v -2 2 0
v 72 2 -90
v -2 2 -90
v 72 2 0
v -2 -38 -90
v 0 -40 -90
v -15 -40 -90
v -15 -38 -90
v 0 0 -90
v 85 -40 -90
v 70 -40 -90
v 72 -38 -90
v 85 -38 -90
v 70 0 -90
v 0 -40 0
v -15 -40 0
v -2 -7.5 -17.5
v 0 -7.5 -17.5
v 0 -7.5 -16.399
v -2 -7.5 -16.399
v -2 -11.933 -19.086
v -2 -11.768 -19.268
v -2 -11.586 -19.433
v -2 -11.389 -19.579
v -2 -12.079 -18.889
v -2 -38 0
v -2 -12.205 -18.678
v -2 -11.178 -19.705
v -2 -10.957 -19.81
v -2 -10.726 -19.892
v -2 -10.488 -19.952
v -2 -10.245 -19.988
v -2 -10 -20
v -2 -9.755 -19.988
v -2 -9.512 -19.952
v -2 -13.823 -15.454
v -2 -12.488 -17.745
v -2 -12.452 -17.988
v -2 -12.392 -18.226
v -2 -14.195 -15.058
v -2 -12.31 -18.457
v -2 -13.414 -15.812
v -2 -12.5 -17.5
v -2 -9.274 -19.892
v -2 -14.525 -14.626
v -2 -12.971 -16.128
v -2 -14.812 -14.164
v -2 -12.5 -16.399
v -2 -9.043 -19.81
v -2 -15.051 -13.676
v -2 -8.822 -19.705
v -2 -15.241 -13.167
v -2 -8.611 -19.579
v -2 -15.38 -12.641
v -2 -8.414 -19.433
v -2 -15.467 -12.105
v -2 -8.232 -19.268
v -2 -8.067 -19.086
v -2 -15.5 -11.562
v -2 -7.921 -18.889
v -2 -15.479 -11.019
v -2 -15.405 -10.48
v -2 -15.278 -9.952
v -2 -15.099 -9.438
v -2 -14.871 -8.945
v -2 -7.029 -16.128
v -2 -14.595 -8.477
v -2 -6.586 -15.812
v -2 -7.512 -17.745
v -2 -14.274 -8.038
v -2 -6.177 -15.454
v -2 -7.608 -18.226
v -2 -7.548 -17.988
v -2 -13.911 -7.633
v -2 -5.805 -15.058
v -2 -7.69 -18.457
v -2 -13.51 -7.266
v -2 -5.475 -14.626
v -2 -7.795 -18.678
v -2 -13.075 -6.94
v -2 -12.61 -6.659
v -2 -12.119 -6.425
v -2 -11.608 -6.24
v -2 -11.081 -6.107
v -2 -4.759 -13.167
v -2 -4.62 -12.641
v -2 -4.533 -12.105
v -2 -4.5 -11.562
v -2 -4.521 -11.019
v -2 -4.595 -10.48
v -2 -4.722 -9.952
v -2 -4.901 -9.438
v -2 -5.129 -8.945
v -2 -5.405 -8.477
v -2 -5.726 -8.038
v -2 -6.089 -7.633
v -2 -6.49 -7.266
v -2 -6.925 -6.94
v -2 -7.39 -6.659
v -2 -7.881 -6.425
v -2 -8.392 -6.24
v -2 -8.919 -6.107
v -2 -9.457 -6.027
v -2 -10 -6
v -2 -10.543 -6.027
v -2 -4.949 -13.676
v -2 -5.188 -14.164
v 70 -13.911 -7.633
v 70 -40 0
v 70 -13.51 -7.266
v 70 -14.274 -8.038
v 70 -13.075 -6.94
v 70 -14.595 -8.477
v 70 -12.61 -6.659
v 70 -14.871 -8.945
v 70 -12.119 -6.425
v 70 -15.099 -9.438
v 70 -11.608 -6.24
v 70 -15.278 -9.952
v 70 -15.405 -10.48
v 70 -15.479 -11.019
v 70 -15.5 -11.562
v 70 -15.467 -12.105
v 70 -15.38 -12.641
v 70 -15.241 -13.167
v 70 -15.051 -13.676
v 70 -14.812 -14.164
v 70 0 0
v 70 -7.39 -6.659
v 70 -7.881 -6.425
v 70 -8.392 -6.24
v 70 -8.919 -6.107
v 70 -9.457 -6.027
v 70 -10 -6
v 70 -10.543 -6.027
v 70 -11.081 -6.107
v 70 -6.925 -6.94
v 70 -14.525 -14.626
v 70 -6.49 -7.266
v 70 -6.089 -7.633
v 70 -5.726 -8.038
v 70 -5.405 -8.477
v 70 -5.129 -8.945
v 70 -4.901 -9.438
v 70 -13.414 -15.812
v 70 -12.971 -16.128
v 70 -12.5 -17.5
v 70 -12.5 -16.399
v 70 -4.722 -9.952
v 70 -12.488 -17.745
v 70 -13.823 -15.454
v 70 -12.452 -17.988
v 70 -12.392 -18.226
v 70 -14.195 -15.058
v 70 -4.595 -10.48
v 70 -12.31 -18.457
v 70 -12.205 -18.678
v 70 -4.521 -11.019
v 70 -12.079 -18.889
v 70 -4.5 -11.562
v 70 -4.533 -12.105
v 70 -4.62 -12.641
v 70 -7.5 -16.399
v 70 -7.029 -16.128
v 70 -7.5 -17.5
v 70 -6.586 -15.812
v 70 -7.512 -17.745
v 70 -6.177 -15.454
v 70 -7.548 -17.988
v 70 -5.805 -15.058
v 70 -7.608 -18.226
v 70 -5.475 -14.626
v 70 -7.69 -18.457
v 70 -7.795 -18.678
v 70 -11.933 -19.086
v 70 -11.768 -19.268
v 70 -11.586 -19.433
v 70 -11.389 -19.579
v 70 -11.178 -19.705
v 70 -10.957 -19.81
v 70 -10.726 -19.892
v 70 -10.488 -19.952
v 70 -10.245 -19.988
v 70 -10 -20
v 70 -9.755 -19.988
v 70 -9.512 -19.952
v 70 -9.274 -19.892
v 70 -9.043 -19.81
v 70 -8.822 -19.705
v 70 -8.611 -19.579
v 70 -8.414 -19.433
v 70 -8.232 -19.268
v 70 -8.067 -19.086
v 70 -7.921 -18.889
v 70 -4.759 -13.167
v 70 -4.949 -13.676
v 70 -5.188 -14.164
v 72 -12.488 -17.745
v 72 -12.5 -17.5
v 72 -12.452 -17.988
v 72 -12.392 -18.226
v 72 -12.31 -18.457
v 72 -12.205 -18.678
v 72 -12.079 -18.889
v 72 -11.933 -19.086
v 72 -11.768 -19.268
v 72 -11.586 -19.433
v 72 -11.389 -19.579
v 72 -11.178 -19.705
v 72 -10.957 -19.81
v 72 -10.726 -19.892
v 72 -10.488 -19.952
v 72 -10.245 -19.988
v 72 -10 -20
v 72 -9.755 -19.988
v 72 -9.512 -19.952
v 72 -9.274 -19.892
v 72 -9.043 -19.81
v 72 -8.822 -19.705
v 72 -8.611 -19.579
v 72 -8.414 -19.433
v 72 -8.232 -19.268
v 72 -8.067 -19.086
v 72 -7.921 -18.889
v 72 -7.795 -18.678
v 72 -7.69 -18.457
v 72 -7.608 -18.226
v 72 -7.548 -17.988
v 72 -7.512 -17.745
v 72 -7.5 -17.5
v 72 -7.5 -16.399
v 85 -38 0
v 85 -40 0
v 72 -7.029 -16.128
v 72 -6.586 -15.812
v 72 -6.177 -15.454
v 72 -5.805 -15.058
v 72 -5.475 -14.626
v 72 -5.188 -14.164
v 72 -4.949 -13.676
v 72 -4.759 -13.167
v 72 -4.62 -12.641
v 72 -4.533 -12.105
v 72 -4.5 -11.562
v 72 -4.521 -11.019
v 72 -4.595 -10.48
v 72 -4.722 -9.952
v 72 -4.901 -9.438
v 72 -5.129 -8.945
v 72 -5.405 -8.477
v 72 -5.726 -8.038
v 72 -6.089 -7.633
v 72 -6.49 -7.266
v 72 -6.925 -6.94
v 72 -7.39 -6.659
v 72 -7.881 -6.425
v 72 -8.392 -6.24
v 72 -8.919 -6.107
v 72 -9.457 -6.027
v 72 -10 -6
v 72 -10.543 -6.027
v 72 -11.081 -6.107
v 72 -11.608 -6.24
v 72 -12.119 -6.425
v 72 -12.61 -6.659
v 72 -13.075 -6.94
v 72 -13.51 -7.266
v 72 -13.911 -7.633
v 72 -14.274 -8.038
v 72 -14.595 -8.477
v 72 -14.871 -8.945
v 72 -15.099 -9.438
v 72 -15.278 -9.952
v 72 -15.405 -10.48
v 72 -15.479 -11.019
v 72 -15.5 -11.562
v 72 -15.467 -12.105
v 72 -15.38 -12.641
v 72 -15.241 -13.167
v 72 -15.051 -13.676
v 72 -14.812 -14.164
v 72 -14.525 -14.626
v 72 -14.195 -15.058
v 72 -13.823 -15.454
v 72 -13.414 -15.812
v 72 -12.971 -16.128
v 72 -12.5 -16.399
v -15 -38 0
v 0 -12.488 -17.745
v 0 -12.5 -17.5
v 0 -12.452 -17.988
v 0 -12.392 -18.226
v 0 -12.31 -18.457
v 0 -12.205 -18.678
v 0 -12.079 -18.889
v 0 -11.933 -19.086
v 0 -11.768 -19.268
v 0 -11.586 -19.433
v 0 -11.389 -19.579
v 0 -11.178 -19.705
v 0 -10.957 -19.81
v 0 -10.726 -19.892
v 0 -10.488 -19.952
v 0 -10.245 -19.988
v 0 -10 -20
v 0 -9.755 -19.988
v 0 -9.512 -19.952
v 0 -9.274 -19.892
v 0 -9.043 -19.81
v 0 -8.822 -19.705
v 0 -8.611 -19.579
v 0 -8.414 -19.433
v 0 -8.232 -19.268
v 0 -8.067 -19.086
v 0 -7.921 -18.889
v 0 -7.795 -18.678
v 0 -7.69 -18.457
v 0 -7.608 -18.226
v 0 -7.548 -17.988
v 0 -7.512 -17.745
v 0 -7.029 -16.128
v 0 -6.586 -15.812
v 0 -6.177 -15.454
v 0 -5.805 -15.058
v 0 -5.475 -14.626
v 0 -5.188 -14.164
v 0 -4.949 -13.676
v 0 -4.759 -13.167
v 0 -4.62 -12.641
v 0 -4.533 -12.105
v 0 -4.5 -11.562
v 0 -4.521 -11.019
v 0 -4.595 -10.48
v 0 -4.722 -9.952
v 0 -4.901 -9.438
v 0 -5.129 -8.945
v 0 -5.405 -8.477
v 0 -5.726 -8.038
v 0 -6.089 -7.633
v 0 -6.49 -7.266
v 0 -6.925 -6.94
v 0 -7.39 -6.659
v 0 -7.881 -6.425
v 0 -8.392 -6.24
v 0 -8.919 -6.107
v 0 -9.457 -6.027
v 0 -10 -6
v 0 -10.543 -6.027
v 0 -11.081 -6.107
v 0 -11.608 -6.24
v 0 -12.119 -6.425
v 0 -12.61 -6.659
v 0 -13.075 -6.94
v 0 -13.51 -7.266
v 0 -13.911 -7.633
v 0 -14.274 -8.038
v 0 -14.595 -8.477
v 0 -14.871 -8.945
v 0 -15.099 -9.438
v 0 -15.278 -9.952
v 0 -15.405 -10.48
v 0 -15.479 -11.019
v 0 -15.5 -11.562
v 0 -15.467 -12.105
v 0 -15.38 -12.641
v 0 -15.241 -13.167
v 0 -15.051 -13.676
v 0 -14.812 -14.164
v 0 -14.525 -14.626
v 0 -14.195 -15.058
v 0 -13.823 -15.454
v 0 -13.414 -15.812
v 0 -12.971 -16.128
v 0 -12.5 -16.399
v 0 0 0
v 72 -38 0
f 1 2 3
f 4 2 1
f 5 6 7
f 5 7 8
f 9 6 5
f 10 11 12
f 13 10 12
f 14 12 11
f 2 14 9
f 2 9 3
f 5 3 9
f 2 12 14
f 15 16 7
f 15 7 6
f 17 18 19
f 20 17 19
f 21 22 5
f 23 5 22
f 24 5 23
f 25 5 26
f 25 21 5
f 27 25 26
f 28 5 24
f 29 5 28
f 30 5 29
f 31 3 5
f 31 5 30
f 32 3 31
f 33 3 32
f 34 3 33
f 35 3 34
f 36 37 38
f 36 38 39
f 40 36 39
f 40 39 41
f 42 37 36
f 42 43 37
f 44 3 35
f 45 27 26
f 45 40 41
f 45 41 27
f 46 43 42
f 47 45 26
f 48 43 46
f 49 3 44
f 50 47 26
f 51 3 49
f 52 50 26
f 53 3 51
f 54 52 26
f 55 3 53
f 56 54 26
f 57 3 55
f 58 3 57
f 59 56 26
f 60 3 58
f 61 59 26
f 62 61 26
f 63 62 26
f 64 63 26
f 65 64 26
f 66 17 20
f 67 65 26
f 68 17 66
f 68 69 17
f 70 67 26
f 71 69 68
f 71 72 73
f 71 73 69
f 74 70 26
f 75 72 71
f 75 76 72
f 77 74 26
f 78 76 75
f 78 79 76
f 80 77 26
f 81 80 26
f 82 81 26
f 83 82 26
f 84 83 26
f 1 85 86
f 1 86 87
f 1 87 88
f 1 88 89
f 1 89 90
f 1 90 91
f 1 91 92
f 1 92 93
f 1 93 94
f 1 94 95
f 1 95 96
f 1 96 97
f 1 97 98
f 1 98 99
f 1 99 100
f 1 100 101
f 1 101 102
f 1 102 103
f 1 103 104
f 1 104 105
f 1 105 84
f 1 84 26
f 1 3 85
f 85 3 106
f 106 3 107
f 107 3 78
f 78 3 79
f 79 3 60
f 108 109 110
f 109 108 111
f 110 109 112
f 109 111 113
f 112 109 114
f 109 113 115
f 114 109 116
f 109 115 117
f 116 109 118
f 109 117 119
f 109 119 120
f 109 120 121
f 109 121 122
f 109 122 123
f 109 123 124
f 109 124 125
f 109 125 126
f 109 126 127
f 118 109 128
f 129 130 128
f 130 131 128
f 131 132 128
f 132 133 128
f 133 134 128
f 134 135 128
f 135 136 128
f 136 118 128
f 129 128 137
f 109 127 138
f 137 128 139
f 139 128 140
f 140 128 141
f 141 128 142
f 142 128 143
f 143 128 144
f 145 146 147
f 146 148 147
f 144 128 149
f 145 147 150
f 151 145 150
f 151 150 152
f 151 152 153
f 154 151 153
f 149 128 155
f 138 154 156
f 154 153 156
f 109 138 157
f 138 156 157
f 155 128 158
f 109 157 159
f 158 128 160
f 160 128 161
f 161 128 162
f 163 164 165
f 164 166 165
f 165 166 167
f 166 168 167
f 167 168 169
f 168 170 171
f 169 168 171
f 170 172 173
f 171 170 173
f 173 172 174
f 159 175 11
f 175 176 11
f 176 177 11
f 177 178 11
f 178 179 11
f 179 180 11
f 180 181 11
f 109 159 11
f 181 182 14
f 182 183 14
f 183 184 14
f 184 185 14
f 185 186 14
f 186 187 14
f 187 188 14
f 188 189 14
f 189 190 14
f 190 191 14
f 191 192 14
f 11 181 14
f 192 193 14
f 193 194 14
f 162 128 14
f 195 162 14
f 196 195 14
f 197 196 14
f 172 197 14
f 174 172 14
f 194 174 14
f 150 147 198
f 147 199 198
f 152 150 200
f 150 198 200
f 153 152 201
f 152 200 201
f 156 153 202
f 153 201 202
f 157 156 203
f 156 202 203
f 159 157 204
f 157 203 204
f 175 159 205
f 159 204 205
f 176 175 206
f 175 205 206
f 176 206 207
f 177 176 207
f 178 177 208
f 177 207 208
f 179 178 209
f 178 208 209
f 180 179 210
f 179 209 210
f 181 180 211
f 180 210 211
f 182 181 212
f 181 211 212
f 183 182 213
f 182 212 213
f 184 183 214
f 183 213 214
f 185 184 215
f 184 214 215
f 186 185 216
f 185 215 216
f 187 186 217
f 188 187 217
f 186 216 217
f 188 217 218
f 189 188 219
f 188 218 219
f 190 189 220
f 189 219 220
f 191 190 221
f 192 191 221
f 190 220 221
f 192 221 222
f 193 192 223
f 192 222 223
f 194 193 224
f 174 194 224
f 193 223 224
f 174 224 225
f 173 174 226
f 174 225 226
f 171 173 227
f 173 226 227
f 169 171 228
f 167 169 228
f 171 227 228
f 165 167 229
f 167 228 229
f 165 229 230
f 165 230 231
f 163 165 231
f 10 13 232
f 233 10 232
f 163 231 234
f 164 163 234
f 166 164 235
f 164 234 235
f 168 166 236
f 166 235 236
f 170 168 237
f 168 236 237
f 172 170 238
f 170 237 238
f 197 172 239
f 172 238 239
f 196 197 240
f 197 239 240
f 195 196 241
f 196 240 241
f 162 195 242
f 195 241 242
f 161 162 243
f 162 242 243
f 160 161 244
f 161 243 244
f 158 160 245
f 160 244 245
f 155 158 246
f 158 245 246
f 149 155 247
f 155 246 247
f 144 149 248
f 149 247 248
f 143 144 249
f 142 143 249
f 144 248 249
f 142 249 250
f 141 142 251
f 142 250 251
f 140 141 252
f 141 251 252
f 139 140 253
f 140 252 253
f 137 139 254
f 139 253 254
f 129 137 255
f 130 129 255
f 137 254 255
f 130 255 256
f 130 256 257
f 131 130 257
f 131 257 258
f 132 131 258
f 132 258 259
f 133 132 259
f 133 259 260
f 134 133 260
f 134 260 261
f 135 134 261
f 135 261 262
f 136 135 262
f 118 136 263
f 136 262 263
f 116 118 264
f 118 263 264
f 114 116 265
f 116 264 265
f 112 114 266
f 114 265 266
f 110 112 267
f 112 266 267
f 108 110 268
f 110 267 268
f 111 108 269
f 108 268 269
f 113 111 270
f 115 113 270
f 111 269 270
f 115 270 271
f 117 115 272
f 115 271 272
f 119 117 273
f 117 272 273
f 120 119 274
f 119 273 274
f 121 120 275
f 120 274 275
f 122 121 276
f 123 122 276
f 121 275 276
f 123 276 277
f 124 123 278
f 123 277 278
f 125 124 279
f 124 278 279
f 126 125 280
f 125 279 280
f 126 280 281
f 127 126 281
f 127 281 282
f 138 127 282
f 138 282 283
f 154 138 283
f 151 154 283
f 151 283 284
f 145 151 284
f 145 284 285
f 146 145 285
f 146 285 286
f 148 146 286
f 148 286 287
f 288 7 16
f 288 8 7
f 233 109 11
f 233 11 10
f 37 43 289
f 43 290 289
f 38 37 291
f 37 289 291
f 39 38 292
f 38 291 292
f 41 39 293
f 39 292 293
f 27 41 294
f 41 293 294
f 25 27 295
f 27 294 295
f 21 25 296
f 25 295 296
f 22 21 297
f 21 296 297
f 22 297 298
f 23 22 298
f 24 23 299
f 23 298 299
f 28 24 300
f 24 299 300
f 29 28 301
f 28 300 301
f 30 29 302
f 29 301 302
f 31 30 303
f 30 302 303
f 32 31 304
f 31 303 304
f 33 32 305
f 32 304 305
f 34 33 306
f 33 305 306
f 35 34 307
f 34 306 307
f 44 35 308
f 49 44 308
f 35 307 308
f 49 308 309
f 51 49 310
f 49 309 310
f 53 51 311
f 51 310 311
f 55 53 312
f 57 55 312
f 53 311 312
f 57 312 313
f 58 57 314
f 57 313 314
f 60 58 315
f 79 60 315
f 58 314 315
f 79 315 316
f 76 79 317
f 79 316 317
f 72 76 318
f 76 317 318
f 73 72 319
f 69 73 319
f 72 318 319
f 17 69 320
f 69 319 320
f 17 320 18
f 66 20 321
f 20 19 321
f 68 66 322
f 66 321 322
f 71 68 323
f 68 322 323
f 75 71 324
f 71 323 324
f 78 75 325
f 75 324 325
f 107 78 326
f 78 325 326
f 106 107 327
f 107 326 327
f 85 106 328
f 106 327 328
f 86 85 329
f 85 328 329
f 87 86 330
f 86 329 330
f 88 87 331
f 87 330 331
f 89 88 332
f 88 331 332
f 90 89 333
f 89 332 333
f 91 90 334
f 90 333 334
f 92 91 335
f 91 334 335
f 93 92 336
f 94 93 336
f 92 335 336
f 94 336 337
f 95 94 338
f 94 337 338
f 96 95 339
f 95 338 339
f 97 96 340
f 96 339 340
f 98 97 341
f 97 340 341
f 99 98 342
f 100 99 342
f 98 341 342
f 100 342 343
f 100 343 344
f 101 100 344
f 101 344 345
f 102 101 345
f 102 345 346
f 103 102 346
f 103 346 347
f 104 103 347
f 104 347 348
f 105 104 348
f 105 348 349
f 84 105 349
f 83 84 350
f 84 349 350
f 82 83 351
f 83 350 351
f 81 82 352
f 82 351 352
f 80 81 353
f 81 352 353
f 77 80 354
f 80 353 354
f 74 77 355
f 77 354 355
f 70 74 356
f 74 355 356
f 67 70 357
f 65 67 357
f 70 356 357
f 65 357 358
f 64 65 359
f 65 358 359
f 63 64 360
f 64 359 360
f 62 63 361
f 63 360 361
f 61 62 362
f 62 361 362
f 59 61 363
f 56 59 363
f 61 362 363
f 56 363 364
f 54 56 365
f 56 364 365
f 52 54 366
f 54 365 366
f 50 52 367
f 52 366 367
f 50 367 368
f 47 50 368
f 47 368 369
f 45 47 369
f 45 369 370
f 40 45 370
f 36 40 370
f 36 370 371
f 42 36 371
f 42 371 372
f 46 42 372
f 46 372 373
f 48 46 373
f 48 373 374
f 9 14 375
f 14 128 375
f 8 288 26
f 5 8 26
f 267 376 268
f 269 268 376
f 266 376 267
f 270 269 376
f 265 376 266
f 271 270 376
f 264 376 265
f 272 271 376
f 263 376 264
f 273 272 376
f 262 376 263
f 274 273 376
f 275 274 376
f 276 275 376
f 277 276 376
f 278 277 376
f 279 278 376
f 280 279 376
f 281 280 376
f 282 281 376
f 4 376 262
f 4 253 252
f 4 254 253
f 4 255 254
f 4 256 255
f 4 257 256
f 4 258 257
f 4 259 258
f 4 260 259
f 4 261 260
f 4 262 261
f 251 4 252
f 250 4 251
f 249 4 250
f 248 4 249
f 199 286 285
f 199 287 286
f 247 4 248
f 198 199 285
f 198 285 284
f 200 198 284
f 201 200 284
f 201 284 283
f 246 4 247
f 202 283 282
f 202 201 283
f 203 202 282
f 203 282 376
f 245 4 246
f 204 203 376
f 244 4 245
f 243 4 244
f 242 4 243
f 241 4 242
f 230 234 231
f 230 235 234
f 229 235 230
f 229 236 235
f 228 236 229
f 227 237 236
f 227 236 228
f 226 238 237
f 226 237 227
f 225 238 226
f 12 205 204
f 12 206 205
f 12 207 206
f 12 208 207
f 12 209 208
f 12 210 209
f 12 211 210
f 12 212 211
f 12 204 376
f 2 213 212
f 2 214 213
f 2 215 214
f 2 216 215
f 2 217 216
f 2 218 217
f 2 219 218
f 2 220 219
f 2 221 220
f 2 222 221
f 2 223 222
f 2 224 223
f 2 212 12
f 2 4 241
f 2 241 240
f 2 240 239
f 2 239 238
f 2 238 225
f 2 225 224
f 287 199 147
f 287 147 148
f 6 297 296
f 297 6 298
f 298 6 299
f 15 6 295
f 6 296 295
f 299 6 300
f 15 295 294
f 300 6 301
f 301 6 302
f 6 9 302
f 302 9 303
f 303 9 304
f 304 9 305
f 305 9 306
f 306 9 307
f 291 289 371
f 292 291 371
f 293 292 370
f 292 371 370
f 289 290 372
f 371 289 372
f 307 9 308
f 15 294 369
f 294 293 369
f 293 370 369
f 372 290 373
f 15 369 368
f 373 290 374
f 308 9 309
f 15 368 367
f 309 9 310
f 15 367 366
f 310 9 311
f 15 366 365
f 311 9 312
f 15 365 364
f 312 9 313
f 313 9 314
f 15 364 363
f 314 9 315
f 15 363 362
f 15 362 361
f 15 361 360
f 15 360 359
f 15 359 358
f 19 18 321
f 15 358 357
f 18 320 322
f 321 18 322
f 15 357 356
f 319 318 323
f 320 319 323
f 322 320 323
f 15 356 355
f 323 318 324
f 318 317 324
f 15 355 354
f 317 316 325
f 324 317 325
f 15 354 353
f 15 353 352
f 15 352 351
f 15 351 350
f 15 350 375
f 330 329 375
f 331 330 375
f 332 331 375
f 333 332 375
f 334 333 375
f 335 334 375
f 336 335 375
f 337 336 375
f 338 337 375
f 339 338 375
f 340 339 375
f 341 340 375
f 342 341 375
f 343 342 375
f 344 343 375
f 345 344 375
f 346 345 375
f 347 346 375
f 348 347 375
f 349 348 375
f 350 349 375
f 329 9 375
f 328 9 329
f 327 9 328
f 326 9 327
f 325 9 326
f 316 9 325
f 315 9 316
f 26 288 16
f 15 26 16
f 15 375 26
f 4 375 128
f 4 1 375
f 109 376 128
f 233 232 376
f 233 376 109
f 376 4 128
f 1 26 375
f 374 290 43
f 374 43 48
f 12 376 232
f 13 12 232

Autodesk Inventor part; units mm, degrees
ref_plane "YZ Plane" through (0, 0, 0) normal (1, 0, 0) x (0, 1, 0)
ref_plane "XZ Plane" through (0, 0, 0) normal (0, 1, 0) x (-1, 0, 0)
ref_plane "XY Plane" through (0, 0, 0) normal (0, 0, 1) x (1, 0, 0)
sketch "Sketch1" plane through (0, 0, 0) normal (0, 1, 0) x (-1, 0, 0)
  line L0 (0, 0) -> (-70, 0)
  line L1 (-70, 0) -> (-70, -90)
  line L2 (-70, -90) -> (0, -90)
  line L3 (0, -90) -> (0, 0)
  dimension "d0" = 70
  dimension "d1" = 90
extrude "Extrusion1" add sketch "Sketch1" along normal blind 2
sketch "Sketch2" plane through (70, 0, 0) normal (1, 0, 0) x (0, 0, -1)
  line L0 (0, 2) -> (90, 2) projected
  line L1 (0, 2) -> (90, 2)
  line L2 (90, 2) -> (90, -38)
  line L3 (90, -38) -> (0, -38)
  line L4 (0, -38) -> (0, 2)
  point P0 (0, 0)
  dimension "d4" = 90
  dimension "d5" = 40
extrude "Extrusion2" add sketch "Sketch2" along normal blind 2
sketch "Sketch3" plane through (0, 0, -90) normal (-1, 0, 0) x (0, 0, 1)
  line L0 (0, 2) -> (90, 2) projected
  line L1 (90, -38) -> (0, -38) projected
  line L2 (0, 2) -> (90, 2)
  line L3 (90, 2) -> (90, -38)
  line L4 (90, -38) -> (0, -38)
  line L5 (0, -38) -> (0, 2)
  point P0 (90, 0)
extrude "Extrusion3" add sketch "Sketch3" along normal blind 2
sketch "Sketch4" plane through (70, -38, -90) normal (0, -1, 0) x (1, 0, 0)
  line L0 (0, 90) -> (0, 0) projected
  line L1 (0, 0) -> (15, 0)
  line L2 (15, 0) -> (15, 90)
  line L3 (15, 90) -> (0, 90)
  line L4 (0, 90) -> (0, 0)
  line L5 (-70, 0) -> (-70, 90) projected
  line L6 (-70, 0) -> (-85, 0)
  line L7 (-85, 0) -> (-85, 90)
  line L8 (-85, 90) -> (-70, 90)
  line L9 (-70, 90) -> (-70, 0)
  dimension "d10" = 15
  dimension "d11" = 15
extrude "Extrusion4" add sketch "Sketch4" along normal blind 2
sketch "Sketch5" plane through (72, 0, 0) normal (1, 0, 0) x (0, 0, -1)
  arc A0 (16.399, -7.5) -> (16.399, -12.5) centre (11.5, -10) ccw
  line L0 (0, 2) -> (0, -38) projected
  line L1 (0, 0) -> (90, 0) projected
  arc A1 (17.5, -12.5) -> (17.5, -7.5) centre (17.5, -10) ccw
  line L2 (17.5, -7.5) -> (16.399, -7.5)
  line L3 (17.5, -12.5) -> (16.399, -12.5)
  dimension "d14" = 11
  dimension "d15" = 11.5
  dimension "d18" = 5
extrude "Extrusion5" cut sketch "Sketch5" against normal blind 95
properties part number "wc" material "Wood (Birch)"
